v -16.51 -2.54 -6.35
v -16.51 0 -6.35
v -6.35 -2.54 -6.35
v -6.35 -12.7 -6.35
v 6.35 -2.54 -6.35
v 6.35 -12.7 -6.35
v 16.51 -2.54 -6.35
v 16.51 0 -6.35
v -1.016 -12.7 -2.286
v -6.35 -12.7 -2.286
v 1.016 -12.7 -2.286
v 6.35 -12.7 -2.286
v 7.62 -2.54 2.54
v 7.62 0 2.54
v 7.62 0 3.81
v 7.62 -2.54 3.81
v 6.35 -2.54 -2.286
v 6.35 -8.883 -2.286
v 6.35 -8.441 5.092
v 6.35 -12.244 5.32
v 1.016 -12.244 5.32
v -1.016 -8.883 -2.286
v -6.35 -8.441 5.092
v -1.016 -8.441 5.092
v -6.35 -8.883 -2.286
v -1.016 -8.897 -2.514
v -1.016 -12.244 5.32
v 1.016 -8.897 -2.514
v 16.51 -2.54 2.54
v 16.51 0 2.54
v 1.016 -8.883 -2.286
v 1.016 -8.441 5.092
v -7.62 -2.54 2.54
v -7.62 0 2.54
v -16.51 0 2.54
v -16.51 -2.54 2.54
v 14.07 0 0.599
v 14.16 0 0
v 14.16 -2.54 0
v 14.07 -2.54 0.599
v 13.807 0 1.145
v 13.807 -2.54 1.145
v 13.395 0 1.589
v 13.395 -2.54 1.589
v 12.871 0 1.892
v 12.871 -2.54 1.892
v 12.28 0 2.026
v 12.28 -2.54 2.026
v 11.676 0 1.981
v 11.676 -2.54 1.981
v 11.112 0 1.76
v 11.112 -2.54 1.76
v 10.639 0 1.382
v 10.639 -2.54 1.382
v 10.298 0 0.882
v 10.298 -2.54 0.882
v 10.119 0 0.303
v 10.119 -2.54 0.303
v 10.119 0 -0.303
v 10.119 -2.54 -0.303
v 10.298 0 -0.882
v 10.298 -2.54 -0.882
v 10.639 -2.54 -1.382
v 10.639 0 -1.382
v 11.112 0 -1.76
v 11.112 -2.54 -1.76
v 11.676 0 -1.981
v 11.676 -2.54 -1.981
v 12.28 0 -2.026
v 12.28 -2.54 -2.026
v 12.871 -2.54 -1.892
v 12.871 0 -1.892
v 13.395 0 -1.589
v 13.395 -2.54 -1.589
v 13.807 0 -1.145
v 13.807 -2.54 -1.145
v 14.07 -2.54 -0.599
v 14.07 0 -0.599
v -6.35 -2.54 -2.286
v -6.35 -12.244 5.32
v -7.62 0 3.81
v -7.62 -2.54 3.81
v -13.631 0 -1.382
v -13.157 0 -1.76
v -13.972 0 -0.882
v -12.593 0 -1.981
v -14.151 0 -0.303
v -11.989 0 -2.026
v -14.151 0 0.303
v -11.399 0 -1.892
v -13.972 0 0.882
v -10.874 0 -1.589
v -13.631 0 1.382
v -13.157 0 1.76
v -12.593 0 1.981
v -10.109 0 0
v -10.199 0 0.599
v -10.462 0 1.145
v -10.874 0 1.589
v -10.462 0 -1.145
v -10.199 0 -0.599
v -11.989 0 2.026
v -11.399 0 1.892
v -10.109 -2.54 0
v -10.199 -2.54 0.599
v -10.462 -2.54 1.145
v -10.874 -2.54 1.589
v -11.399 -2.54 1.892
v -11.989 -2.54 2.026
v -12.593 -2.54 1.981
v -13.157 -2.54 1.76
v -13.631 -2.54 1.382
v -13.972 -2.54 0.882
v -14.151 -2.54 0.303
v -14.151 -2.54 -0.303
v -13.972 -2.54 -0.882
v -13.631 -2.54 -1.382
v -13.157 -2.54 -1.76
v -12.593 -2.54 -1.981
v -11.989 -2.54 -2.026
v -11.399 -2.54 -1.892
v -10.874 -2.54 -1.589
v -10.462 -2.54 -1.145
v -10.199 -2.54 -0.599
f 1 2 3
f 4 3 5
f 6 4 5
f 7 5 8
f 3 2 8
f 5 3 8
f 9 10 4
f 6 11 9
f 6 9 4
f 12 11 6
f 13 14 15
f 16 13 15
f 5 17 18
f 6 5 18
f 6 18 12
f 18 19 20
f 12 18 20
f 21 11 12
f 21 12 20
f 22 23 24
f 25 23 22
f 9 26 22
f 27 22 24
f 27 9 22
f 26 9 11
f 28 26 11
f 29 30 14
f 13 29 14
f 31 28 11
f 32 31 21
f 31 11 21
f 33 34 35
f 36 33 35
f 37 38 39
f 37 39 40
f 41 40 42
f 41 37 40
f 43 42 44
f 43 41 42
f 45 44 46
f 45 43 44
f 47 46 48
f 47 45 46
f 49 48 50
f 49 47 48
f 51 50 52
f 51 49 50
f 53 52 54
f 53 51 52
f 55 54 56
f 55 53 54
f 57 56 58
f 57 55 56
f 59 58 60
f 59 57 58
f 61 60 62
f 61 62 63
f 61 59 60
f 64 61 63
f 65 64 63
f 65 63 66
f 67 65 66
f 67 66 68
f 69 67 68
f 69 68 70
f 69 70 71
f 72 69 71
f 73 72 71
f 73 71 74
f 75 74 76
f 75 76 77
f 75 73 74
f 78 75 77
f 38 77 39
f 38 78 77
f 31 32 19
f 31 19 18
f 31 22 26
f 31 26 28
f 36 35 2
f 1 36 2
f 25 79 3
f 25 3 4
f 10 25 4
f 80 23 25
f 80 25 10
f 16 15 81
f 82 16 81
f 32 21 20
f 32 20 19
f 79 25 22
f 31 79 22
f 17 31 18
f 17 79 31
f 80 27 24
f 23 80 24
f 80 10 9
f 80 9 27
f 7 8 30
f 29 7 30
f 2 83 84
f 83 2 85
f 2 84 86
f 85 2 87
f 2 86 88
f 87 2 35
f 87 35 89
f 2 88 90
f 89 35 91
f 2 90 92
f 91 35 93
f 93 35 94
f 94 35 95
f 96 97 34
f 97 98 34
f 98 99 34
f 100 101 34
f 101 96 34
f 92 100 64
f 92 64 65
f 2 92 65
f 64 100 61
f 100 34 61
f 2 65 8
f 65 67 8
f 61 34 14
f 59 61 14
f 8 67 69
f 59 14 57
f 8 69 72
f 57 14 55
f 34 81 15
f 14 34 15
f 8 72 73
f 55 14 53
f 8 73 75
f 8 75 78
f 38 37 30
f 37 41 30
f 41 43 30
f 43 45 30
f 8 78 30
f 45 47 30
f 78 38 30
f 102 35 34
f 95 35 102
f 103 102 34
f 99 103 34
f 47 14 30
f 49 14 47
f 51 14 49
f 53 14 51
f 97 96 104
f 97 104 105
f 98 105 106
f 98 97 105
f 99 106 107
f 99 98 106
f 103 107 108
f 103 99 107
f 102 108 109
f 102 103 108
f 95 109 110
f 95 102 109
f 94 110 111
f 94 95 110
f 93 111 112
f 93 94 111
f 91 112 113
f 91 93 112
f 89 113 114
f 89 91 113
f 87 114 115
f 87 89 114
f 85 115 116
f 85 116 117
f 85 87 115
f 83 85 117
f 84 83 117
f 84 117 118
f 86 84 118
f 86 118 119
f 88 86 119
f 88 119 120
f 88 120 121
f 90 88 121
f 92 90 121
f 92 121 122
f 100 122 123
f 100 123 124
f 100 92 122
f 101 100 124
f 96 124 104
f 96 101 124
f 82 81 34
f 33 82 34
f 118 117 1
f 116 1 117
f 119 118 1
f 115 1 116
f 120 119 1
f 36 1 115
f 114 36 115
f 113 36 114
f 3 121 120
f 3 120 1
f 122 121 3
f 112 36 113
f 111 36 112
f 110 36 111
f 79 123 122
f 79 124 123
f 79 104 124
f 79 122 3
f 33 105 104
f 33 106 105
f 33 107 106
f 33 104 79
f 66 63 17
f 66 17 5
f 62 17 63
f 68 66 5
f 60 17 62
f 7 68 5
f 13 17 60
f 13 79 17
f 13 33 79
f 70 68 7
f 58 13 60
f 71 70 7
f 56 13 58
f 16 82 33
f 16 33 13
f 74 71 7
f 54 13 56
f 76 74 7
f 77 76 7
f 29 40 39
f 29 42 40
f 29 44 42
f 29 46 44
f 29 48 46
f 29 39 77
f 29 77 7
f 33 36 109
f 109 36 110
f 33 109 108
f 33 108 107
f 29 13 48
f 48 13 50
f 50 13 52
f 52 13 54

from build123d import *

# Parameters (mm, degrees)
F0_R     = 2.032
F1_DEPTH = 2.54
F2_W     = 12.7
F2_H     = 4.064
F3_DEPTH = 10.16
F5_DEPTH = 12.7
F6_W     = 2.032
F6_H     = 7.62
F7_DEPTH = 3.81


with BuildPart() as f1:
    # F0 (on Front) → F1 (new body)
    with BuildSketch(Plane.XZ):
        Polygon((7.62, 3.81), (-7.62, 3.81), (-7.62, 2.54), (-16.51, 2.54), (-16.51, -6.35), (16.51, -6.35), (16.51, 2.54), (7.62, 2.54), align=None)
        with Locations((-12.1412, 0)):
            Circle(F0_R, mode=Mode.SUBTRACT)
        with Locations((12.1285, 0)):
            Circle(F0_R, mode=Mode.SUBTRACT)
    extrude(amount=F1_DEPTH)

    # F2 (on face) → F3 (join)
    with BuildSketch(Plane.XZ.offset(2.54)):
        with Locations((0, -4.318)):
            Rectangle(F2_W, F2_H)
    extrude(amount=F3_DEPTH)

    # F4 (on face) → F5 (join)
    with BuildSketch(Plane(origin=(-6.35, 0, 0), x_dir=(0, -1, 0), z_dir=(-1, 0, 0))):
        Polygon((8.8831661625, -2.286), (12.7, -2.286), (12.2442190351, 5.3203567963), (8.441040637, 5.0924663138), align=None)
    extrude(amount=-F5_DEPTH)

    # F6 (on face) → F7 (cut)
    with BuildSketch(Plane(origin=(0, -12.5180738926, 0.7500962617), x_dir=(1, 0, 0), z_dir=(0, -0.9982095533, 0.0598137749))):
        with Locations((0, 0.7684580196)):
            Rectangle(F6_W, F6_H)
    extrude(amount=-F7_DEPTH, mode=Mode.SUBTRACT)


solid = f1.part
